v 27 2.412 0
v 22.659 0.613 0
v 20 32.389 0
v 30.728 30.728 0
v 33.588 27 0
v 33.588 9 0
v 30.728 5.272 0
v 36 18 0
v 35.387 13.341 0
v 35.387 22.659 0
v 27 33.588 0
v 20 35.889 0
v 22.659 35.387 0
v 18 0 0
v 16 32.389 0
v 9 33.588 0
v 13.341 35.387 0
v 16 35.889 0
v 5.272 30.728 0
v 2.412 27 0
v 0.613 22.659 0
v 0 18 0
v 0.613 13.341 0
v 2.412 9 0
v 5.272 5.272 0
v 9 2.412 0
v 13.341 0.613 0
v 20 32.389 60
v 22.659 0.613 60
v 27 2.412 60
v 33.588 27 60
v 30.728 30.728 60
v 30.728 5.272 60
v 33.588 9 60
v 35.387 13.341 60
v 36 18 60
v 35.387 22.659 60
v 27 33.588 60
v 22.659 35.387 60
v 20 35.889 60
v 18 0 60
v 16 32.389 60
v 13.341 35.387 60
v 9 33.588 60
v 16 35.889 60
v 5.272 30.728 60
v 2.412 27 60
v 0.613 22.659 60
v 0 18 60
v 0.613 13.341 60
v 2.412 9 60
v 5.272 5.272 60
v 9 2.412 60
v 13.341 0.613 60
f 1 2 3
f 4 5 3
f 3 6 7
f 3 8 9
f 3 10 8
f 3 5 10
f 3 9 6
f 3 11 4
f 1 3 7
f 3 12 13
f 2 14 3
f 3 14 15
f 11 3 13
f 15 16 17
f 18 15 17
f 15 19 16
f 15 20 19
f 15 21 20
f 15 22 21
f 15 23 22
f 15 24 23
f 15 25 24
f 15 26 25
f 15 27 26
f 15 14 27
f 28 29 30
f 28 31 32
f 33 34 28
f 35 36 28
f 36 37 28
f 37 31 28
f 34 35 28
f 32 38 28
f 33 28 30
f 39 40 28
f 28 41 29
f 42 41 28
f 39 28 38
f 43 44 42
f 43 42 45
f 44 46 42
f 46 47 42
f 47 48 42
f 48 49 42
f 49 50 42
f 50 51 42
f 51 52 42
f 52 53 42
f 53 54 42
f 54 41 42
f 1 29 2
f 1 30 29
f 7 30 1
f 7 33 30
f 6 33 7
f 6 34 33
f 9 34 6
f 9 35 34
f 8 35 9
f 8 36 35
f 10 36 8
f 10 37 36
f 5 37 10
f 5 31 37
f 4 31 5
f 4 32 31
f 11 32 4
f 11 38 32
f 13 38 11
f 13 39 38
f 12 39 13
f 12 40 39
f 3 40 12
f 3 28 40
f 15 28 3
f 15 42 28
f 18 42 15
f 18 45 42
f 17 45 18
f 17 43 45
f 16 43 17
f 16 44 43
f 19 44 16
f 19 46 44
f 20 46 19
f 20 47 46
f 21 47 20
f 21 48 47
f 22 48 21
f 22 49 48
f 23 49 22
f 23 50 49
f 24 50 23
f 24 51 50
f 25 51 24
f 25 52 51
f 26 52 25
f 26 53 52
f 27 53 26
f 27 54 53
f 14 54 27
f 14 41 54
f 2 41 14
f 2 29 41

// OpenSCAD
$fn = 32;

// ----------------------------------------------------------------------
// Keyway shaft: d36 shaft, key 4 x 3.5 mm
// ----------------------------------------------------------------------

// --- parameters (mm) ---
shaft_r = 18;             // shaft radius
key_w = 4;                // keyway width
key_d = 3.5;              // keyway depth below the surface line
plate_t = 60;             // shaft length, Z (extrusion height)
fit_tol = 0.1;            // declared fit tolerance (prompt contract)
free_tol = 0.5;           // declared free tolerance (prompt contract)

shaft_d = 2 * shaft_r;  // shaft diameter
circle_step = 15;  // polygon sampling step, degrees

profile = [[13.341, 35.387], [9, 33.588], [5.272, 30.728], [2.412, 27], [0.613, 22.659], [0, 18], [0.613, 13.341], [2.412, 9], [5.272, 5.272], [9, 2.412], [13.341, 0.613], [18, 0], [22.659, 0.613], [27, 2.412], [30.728, 5.272], [33.588, 9], [35.387, 13.341], [36, 18], [35.387, 22.659], [33.588, 27], [30.728, 30.728], [27, 33.588], [22.659, 35.387], [20, 35.889], [20, 32.389], [16, 32.389], [16, 35.889]];  // primary outline, 27 points, counter clockwise

// --- the one profile operation ---
linear_extrude(height = plate_t) polygon(points = profile);
